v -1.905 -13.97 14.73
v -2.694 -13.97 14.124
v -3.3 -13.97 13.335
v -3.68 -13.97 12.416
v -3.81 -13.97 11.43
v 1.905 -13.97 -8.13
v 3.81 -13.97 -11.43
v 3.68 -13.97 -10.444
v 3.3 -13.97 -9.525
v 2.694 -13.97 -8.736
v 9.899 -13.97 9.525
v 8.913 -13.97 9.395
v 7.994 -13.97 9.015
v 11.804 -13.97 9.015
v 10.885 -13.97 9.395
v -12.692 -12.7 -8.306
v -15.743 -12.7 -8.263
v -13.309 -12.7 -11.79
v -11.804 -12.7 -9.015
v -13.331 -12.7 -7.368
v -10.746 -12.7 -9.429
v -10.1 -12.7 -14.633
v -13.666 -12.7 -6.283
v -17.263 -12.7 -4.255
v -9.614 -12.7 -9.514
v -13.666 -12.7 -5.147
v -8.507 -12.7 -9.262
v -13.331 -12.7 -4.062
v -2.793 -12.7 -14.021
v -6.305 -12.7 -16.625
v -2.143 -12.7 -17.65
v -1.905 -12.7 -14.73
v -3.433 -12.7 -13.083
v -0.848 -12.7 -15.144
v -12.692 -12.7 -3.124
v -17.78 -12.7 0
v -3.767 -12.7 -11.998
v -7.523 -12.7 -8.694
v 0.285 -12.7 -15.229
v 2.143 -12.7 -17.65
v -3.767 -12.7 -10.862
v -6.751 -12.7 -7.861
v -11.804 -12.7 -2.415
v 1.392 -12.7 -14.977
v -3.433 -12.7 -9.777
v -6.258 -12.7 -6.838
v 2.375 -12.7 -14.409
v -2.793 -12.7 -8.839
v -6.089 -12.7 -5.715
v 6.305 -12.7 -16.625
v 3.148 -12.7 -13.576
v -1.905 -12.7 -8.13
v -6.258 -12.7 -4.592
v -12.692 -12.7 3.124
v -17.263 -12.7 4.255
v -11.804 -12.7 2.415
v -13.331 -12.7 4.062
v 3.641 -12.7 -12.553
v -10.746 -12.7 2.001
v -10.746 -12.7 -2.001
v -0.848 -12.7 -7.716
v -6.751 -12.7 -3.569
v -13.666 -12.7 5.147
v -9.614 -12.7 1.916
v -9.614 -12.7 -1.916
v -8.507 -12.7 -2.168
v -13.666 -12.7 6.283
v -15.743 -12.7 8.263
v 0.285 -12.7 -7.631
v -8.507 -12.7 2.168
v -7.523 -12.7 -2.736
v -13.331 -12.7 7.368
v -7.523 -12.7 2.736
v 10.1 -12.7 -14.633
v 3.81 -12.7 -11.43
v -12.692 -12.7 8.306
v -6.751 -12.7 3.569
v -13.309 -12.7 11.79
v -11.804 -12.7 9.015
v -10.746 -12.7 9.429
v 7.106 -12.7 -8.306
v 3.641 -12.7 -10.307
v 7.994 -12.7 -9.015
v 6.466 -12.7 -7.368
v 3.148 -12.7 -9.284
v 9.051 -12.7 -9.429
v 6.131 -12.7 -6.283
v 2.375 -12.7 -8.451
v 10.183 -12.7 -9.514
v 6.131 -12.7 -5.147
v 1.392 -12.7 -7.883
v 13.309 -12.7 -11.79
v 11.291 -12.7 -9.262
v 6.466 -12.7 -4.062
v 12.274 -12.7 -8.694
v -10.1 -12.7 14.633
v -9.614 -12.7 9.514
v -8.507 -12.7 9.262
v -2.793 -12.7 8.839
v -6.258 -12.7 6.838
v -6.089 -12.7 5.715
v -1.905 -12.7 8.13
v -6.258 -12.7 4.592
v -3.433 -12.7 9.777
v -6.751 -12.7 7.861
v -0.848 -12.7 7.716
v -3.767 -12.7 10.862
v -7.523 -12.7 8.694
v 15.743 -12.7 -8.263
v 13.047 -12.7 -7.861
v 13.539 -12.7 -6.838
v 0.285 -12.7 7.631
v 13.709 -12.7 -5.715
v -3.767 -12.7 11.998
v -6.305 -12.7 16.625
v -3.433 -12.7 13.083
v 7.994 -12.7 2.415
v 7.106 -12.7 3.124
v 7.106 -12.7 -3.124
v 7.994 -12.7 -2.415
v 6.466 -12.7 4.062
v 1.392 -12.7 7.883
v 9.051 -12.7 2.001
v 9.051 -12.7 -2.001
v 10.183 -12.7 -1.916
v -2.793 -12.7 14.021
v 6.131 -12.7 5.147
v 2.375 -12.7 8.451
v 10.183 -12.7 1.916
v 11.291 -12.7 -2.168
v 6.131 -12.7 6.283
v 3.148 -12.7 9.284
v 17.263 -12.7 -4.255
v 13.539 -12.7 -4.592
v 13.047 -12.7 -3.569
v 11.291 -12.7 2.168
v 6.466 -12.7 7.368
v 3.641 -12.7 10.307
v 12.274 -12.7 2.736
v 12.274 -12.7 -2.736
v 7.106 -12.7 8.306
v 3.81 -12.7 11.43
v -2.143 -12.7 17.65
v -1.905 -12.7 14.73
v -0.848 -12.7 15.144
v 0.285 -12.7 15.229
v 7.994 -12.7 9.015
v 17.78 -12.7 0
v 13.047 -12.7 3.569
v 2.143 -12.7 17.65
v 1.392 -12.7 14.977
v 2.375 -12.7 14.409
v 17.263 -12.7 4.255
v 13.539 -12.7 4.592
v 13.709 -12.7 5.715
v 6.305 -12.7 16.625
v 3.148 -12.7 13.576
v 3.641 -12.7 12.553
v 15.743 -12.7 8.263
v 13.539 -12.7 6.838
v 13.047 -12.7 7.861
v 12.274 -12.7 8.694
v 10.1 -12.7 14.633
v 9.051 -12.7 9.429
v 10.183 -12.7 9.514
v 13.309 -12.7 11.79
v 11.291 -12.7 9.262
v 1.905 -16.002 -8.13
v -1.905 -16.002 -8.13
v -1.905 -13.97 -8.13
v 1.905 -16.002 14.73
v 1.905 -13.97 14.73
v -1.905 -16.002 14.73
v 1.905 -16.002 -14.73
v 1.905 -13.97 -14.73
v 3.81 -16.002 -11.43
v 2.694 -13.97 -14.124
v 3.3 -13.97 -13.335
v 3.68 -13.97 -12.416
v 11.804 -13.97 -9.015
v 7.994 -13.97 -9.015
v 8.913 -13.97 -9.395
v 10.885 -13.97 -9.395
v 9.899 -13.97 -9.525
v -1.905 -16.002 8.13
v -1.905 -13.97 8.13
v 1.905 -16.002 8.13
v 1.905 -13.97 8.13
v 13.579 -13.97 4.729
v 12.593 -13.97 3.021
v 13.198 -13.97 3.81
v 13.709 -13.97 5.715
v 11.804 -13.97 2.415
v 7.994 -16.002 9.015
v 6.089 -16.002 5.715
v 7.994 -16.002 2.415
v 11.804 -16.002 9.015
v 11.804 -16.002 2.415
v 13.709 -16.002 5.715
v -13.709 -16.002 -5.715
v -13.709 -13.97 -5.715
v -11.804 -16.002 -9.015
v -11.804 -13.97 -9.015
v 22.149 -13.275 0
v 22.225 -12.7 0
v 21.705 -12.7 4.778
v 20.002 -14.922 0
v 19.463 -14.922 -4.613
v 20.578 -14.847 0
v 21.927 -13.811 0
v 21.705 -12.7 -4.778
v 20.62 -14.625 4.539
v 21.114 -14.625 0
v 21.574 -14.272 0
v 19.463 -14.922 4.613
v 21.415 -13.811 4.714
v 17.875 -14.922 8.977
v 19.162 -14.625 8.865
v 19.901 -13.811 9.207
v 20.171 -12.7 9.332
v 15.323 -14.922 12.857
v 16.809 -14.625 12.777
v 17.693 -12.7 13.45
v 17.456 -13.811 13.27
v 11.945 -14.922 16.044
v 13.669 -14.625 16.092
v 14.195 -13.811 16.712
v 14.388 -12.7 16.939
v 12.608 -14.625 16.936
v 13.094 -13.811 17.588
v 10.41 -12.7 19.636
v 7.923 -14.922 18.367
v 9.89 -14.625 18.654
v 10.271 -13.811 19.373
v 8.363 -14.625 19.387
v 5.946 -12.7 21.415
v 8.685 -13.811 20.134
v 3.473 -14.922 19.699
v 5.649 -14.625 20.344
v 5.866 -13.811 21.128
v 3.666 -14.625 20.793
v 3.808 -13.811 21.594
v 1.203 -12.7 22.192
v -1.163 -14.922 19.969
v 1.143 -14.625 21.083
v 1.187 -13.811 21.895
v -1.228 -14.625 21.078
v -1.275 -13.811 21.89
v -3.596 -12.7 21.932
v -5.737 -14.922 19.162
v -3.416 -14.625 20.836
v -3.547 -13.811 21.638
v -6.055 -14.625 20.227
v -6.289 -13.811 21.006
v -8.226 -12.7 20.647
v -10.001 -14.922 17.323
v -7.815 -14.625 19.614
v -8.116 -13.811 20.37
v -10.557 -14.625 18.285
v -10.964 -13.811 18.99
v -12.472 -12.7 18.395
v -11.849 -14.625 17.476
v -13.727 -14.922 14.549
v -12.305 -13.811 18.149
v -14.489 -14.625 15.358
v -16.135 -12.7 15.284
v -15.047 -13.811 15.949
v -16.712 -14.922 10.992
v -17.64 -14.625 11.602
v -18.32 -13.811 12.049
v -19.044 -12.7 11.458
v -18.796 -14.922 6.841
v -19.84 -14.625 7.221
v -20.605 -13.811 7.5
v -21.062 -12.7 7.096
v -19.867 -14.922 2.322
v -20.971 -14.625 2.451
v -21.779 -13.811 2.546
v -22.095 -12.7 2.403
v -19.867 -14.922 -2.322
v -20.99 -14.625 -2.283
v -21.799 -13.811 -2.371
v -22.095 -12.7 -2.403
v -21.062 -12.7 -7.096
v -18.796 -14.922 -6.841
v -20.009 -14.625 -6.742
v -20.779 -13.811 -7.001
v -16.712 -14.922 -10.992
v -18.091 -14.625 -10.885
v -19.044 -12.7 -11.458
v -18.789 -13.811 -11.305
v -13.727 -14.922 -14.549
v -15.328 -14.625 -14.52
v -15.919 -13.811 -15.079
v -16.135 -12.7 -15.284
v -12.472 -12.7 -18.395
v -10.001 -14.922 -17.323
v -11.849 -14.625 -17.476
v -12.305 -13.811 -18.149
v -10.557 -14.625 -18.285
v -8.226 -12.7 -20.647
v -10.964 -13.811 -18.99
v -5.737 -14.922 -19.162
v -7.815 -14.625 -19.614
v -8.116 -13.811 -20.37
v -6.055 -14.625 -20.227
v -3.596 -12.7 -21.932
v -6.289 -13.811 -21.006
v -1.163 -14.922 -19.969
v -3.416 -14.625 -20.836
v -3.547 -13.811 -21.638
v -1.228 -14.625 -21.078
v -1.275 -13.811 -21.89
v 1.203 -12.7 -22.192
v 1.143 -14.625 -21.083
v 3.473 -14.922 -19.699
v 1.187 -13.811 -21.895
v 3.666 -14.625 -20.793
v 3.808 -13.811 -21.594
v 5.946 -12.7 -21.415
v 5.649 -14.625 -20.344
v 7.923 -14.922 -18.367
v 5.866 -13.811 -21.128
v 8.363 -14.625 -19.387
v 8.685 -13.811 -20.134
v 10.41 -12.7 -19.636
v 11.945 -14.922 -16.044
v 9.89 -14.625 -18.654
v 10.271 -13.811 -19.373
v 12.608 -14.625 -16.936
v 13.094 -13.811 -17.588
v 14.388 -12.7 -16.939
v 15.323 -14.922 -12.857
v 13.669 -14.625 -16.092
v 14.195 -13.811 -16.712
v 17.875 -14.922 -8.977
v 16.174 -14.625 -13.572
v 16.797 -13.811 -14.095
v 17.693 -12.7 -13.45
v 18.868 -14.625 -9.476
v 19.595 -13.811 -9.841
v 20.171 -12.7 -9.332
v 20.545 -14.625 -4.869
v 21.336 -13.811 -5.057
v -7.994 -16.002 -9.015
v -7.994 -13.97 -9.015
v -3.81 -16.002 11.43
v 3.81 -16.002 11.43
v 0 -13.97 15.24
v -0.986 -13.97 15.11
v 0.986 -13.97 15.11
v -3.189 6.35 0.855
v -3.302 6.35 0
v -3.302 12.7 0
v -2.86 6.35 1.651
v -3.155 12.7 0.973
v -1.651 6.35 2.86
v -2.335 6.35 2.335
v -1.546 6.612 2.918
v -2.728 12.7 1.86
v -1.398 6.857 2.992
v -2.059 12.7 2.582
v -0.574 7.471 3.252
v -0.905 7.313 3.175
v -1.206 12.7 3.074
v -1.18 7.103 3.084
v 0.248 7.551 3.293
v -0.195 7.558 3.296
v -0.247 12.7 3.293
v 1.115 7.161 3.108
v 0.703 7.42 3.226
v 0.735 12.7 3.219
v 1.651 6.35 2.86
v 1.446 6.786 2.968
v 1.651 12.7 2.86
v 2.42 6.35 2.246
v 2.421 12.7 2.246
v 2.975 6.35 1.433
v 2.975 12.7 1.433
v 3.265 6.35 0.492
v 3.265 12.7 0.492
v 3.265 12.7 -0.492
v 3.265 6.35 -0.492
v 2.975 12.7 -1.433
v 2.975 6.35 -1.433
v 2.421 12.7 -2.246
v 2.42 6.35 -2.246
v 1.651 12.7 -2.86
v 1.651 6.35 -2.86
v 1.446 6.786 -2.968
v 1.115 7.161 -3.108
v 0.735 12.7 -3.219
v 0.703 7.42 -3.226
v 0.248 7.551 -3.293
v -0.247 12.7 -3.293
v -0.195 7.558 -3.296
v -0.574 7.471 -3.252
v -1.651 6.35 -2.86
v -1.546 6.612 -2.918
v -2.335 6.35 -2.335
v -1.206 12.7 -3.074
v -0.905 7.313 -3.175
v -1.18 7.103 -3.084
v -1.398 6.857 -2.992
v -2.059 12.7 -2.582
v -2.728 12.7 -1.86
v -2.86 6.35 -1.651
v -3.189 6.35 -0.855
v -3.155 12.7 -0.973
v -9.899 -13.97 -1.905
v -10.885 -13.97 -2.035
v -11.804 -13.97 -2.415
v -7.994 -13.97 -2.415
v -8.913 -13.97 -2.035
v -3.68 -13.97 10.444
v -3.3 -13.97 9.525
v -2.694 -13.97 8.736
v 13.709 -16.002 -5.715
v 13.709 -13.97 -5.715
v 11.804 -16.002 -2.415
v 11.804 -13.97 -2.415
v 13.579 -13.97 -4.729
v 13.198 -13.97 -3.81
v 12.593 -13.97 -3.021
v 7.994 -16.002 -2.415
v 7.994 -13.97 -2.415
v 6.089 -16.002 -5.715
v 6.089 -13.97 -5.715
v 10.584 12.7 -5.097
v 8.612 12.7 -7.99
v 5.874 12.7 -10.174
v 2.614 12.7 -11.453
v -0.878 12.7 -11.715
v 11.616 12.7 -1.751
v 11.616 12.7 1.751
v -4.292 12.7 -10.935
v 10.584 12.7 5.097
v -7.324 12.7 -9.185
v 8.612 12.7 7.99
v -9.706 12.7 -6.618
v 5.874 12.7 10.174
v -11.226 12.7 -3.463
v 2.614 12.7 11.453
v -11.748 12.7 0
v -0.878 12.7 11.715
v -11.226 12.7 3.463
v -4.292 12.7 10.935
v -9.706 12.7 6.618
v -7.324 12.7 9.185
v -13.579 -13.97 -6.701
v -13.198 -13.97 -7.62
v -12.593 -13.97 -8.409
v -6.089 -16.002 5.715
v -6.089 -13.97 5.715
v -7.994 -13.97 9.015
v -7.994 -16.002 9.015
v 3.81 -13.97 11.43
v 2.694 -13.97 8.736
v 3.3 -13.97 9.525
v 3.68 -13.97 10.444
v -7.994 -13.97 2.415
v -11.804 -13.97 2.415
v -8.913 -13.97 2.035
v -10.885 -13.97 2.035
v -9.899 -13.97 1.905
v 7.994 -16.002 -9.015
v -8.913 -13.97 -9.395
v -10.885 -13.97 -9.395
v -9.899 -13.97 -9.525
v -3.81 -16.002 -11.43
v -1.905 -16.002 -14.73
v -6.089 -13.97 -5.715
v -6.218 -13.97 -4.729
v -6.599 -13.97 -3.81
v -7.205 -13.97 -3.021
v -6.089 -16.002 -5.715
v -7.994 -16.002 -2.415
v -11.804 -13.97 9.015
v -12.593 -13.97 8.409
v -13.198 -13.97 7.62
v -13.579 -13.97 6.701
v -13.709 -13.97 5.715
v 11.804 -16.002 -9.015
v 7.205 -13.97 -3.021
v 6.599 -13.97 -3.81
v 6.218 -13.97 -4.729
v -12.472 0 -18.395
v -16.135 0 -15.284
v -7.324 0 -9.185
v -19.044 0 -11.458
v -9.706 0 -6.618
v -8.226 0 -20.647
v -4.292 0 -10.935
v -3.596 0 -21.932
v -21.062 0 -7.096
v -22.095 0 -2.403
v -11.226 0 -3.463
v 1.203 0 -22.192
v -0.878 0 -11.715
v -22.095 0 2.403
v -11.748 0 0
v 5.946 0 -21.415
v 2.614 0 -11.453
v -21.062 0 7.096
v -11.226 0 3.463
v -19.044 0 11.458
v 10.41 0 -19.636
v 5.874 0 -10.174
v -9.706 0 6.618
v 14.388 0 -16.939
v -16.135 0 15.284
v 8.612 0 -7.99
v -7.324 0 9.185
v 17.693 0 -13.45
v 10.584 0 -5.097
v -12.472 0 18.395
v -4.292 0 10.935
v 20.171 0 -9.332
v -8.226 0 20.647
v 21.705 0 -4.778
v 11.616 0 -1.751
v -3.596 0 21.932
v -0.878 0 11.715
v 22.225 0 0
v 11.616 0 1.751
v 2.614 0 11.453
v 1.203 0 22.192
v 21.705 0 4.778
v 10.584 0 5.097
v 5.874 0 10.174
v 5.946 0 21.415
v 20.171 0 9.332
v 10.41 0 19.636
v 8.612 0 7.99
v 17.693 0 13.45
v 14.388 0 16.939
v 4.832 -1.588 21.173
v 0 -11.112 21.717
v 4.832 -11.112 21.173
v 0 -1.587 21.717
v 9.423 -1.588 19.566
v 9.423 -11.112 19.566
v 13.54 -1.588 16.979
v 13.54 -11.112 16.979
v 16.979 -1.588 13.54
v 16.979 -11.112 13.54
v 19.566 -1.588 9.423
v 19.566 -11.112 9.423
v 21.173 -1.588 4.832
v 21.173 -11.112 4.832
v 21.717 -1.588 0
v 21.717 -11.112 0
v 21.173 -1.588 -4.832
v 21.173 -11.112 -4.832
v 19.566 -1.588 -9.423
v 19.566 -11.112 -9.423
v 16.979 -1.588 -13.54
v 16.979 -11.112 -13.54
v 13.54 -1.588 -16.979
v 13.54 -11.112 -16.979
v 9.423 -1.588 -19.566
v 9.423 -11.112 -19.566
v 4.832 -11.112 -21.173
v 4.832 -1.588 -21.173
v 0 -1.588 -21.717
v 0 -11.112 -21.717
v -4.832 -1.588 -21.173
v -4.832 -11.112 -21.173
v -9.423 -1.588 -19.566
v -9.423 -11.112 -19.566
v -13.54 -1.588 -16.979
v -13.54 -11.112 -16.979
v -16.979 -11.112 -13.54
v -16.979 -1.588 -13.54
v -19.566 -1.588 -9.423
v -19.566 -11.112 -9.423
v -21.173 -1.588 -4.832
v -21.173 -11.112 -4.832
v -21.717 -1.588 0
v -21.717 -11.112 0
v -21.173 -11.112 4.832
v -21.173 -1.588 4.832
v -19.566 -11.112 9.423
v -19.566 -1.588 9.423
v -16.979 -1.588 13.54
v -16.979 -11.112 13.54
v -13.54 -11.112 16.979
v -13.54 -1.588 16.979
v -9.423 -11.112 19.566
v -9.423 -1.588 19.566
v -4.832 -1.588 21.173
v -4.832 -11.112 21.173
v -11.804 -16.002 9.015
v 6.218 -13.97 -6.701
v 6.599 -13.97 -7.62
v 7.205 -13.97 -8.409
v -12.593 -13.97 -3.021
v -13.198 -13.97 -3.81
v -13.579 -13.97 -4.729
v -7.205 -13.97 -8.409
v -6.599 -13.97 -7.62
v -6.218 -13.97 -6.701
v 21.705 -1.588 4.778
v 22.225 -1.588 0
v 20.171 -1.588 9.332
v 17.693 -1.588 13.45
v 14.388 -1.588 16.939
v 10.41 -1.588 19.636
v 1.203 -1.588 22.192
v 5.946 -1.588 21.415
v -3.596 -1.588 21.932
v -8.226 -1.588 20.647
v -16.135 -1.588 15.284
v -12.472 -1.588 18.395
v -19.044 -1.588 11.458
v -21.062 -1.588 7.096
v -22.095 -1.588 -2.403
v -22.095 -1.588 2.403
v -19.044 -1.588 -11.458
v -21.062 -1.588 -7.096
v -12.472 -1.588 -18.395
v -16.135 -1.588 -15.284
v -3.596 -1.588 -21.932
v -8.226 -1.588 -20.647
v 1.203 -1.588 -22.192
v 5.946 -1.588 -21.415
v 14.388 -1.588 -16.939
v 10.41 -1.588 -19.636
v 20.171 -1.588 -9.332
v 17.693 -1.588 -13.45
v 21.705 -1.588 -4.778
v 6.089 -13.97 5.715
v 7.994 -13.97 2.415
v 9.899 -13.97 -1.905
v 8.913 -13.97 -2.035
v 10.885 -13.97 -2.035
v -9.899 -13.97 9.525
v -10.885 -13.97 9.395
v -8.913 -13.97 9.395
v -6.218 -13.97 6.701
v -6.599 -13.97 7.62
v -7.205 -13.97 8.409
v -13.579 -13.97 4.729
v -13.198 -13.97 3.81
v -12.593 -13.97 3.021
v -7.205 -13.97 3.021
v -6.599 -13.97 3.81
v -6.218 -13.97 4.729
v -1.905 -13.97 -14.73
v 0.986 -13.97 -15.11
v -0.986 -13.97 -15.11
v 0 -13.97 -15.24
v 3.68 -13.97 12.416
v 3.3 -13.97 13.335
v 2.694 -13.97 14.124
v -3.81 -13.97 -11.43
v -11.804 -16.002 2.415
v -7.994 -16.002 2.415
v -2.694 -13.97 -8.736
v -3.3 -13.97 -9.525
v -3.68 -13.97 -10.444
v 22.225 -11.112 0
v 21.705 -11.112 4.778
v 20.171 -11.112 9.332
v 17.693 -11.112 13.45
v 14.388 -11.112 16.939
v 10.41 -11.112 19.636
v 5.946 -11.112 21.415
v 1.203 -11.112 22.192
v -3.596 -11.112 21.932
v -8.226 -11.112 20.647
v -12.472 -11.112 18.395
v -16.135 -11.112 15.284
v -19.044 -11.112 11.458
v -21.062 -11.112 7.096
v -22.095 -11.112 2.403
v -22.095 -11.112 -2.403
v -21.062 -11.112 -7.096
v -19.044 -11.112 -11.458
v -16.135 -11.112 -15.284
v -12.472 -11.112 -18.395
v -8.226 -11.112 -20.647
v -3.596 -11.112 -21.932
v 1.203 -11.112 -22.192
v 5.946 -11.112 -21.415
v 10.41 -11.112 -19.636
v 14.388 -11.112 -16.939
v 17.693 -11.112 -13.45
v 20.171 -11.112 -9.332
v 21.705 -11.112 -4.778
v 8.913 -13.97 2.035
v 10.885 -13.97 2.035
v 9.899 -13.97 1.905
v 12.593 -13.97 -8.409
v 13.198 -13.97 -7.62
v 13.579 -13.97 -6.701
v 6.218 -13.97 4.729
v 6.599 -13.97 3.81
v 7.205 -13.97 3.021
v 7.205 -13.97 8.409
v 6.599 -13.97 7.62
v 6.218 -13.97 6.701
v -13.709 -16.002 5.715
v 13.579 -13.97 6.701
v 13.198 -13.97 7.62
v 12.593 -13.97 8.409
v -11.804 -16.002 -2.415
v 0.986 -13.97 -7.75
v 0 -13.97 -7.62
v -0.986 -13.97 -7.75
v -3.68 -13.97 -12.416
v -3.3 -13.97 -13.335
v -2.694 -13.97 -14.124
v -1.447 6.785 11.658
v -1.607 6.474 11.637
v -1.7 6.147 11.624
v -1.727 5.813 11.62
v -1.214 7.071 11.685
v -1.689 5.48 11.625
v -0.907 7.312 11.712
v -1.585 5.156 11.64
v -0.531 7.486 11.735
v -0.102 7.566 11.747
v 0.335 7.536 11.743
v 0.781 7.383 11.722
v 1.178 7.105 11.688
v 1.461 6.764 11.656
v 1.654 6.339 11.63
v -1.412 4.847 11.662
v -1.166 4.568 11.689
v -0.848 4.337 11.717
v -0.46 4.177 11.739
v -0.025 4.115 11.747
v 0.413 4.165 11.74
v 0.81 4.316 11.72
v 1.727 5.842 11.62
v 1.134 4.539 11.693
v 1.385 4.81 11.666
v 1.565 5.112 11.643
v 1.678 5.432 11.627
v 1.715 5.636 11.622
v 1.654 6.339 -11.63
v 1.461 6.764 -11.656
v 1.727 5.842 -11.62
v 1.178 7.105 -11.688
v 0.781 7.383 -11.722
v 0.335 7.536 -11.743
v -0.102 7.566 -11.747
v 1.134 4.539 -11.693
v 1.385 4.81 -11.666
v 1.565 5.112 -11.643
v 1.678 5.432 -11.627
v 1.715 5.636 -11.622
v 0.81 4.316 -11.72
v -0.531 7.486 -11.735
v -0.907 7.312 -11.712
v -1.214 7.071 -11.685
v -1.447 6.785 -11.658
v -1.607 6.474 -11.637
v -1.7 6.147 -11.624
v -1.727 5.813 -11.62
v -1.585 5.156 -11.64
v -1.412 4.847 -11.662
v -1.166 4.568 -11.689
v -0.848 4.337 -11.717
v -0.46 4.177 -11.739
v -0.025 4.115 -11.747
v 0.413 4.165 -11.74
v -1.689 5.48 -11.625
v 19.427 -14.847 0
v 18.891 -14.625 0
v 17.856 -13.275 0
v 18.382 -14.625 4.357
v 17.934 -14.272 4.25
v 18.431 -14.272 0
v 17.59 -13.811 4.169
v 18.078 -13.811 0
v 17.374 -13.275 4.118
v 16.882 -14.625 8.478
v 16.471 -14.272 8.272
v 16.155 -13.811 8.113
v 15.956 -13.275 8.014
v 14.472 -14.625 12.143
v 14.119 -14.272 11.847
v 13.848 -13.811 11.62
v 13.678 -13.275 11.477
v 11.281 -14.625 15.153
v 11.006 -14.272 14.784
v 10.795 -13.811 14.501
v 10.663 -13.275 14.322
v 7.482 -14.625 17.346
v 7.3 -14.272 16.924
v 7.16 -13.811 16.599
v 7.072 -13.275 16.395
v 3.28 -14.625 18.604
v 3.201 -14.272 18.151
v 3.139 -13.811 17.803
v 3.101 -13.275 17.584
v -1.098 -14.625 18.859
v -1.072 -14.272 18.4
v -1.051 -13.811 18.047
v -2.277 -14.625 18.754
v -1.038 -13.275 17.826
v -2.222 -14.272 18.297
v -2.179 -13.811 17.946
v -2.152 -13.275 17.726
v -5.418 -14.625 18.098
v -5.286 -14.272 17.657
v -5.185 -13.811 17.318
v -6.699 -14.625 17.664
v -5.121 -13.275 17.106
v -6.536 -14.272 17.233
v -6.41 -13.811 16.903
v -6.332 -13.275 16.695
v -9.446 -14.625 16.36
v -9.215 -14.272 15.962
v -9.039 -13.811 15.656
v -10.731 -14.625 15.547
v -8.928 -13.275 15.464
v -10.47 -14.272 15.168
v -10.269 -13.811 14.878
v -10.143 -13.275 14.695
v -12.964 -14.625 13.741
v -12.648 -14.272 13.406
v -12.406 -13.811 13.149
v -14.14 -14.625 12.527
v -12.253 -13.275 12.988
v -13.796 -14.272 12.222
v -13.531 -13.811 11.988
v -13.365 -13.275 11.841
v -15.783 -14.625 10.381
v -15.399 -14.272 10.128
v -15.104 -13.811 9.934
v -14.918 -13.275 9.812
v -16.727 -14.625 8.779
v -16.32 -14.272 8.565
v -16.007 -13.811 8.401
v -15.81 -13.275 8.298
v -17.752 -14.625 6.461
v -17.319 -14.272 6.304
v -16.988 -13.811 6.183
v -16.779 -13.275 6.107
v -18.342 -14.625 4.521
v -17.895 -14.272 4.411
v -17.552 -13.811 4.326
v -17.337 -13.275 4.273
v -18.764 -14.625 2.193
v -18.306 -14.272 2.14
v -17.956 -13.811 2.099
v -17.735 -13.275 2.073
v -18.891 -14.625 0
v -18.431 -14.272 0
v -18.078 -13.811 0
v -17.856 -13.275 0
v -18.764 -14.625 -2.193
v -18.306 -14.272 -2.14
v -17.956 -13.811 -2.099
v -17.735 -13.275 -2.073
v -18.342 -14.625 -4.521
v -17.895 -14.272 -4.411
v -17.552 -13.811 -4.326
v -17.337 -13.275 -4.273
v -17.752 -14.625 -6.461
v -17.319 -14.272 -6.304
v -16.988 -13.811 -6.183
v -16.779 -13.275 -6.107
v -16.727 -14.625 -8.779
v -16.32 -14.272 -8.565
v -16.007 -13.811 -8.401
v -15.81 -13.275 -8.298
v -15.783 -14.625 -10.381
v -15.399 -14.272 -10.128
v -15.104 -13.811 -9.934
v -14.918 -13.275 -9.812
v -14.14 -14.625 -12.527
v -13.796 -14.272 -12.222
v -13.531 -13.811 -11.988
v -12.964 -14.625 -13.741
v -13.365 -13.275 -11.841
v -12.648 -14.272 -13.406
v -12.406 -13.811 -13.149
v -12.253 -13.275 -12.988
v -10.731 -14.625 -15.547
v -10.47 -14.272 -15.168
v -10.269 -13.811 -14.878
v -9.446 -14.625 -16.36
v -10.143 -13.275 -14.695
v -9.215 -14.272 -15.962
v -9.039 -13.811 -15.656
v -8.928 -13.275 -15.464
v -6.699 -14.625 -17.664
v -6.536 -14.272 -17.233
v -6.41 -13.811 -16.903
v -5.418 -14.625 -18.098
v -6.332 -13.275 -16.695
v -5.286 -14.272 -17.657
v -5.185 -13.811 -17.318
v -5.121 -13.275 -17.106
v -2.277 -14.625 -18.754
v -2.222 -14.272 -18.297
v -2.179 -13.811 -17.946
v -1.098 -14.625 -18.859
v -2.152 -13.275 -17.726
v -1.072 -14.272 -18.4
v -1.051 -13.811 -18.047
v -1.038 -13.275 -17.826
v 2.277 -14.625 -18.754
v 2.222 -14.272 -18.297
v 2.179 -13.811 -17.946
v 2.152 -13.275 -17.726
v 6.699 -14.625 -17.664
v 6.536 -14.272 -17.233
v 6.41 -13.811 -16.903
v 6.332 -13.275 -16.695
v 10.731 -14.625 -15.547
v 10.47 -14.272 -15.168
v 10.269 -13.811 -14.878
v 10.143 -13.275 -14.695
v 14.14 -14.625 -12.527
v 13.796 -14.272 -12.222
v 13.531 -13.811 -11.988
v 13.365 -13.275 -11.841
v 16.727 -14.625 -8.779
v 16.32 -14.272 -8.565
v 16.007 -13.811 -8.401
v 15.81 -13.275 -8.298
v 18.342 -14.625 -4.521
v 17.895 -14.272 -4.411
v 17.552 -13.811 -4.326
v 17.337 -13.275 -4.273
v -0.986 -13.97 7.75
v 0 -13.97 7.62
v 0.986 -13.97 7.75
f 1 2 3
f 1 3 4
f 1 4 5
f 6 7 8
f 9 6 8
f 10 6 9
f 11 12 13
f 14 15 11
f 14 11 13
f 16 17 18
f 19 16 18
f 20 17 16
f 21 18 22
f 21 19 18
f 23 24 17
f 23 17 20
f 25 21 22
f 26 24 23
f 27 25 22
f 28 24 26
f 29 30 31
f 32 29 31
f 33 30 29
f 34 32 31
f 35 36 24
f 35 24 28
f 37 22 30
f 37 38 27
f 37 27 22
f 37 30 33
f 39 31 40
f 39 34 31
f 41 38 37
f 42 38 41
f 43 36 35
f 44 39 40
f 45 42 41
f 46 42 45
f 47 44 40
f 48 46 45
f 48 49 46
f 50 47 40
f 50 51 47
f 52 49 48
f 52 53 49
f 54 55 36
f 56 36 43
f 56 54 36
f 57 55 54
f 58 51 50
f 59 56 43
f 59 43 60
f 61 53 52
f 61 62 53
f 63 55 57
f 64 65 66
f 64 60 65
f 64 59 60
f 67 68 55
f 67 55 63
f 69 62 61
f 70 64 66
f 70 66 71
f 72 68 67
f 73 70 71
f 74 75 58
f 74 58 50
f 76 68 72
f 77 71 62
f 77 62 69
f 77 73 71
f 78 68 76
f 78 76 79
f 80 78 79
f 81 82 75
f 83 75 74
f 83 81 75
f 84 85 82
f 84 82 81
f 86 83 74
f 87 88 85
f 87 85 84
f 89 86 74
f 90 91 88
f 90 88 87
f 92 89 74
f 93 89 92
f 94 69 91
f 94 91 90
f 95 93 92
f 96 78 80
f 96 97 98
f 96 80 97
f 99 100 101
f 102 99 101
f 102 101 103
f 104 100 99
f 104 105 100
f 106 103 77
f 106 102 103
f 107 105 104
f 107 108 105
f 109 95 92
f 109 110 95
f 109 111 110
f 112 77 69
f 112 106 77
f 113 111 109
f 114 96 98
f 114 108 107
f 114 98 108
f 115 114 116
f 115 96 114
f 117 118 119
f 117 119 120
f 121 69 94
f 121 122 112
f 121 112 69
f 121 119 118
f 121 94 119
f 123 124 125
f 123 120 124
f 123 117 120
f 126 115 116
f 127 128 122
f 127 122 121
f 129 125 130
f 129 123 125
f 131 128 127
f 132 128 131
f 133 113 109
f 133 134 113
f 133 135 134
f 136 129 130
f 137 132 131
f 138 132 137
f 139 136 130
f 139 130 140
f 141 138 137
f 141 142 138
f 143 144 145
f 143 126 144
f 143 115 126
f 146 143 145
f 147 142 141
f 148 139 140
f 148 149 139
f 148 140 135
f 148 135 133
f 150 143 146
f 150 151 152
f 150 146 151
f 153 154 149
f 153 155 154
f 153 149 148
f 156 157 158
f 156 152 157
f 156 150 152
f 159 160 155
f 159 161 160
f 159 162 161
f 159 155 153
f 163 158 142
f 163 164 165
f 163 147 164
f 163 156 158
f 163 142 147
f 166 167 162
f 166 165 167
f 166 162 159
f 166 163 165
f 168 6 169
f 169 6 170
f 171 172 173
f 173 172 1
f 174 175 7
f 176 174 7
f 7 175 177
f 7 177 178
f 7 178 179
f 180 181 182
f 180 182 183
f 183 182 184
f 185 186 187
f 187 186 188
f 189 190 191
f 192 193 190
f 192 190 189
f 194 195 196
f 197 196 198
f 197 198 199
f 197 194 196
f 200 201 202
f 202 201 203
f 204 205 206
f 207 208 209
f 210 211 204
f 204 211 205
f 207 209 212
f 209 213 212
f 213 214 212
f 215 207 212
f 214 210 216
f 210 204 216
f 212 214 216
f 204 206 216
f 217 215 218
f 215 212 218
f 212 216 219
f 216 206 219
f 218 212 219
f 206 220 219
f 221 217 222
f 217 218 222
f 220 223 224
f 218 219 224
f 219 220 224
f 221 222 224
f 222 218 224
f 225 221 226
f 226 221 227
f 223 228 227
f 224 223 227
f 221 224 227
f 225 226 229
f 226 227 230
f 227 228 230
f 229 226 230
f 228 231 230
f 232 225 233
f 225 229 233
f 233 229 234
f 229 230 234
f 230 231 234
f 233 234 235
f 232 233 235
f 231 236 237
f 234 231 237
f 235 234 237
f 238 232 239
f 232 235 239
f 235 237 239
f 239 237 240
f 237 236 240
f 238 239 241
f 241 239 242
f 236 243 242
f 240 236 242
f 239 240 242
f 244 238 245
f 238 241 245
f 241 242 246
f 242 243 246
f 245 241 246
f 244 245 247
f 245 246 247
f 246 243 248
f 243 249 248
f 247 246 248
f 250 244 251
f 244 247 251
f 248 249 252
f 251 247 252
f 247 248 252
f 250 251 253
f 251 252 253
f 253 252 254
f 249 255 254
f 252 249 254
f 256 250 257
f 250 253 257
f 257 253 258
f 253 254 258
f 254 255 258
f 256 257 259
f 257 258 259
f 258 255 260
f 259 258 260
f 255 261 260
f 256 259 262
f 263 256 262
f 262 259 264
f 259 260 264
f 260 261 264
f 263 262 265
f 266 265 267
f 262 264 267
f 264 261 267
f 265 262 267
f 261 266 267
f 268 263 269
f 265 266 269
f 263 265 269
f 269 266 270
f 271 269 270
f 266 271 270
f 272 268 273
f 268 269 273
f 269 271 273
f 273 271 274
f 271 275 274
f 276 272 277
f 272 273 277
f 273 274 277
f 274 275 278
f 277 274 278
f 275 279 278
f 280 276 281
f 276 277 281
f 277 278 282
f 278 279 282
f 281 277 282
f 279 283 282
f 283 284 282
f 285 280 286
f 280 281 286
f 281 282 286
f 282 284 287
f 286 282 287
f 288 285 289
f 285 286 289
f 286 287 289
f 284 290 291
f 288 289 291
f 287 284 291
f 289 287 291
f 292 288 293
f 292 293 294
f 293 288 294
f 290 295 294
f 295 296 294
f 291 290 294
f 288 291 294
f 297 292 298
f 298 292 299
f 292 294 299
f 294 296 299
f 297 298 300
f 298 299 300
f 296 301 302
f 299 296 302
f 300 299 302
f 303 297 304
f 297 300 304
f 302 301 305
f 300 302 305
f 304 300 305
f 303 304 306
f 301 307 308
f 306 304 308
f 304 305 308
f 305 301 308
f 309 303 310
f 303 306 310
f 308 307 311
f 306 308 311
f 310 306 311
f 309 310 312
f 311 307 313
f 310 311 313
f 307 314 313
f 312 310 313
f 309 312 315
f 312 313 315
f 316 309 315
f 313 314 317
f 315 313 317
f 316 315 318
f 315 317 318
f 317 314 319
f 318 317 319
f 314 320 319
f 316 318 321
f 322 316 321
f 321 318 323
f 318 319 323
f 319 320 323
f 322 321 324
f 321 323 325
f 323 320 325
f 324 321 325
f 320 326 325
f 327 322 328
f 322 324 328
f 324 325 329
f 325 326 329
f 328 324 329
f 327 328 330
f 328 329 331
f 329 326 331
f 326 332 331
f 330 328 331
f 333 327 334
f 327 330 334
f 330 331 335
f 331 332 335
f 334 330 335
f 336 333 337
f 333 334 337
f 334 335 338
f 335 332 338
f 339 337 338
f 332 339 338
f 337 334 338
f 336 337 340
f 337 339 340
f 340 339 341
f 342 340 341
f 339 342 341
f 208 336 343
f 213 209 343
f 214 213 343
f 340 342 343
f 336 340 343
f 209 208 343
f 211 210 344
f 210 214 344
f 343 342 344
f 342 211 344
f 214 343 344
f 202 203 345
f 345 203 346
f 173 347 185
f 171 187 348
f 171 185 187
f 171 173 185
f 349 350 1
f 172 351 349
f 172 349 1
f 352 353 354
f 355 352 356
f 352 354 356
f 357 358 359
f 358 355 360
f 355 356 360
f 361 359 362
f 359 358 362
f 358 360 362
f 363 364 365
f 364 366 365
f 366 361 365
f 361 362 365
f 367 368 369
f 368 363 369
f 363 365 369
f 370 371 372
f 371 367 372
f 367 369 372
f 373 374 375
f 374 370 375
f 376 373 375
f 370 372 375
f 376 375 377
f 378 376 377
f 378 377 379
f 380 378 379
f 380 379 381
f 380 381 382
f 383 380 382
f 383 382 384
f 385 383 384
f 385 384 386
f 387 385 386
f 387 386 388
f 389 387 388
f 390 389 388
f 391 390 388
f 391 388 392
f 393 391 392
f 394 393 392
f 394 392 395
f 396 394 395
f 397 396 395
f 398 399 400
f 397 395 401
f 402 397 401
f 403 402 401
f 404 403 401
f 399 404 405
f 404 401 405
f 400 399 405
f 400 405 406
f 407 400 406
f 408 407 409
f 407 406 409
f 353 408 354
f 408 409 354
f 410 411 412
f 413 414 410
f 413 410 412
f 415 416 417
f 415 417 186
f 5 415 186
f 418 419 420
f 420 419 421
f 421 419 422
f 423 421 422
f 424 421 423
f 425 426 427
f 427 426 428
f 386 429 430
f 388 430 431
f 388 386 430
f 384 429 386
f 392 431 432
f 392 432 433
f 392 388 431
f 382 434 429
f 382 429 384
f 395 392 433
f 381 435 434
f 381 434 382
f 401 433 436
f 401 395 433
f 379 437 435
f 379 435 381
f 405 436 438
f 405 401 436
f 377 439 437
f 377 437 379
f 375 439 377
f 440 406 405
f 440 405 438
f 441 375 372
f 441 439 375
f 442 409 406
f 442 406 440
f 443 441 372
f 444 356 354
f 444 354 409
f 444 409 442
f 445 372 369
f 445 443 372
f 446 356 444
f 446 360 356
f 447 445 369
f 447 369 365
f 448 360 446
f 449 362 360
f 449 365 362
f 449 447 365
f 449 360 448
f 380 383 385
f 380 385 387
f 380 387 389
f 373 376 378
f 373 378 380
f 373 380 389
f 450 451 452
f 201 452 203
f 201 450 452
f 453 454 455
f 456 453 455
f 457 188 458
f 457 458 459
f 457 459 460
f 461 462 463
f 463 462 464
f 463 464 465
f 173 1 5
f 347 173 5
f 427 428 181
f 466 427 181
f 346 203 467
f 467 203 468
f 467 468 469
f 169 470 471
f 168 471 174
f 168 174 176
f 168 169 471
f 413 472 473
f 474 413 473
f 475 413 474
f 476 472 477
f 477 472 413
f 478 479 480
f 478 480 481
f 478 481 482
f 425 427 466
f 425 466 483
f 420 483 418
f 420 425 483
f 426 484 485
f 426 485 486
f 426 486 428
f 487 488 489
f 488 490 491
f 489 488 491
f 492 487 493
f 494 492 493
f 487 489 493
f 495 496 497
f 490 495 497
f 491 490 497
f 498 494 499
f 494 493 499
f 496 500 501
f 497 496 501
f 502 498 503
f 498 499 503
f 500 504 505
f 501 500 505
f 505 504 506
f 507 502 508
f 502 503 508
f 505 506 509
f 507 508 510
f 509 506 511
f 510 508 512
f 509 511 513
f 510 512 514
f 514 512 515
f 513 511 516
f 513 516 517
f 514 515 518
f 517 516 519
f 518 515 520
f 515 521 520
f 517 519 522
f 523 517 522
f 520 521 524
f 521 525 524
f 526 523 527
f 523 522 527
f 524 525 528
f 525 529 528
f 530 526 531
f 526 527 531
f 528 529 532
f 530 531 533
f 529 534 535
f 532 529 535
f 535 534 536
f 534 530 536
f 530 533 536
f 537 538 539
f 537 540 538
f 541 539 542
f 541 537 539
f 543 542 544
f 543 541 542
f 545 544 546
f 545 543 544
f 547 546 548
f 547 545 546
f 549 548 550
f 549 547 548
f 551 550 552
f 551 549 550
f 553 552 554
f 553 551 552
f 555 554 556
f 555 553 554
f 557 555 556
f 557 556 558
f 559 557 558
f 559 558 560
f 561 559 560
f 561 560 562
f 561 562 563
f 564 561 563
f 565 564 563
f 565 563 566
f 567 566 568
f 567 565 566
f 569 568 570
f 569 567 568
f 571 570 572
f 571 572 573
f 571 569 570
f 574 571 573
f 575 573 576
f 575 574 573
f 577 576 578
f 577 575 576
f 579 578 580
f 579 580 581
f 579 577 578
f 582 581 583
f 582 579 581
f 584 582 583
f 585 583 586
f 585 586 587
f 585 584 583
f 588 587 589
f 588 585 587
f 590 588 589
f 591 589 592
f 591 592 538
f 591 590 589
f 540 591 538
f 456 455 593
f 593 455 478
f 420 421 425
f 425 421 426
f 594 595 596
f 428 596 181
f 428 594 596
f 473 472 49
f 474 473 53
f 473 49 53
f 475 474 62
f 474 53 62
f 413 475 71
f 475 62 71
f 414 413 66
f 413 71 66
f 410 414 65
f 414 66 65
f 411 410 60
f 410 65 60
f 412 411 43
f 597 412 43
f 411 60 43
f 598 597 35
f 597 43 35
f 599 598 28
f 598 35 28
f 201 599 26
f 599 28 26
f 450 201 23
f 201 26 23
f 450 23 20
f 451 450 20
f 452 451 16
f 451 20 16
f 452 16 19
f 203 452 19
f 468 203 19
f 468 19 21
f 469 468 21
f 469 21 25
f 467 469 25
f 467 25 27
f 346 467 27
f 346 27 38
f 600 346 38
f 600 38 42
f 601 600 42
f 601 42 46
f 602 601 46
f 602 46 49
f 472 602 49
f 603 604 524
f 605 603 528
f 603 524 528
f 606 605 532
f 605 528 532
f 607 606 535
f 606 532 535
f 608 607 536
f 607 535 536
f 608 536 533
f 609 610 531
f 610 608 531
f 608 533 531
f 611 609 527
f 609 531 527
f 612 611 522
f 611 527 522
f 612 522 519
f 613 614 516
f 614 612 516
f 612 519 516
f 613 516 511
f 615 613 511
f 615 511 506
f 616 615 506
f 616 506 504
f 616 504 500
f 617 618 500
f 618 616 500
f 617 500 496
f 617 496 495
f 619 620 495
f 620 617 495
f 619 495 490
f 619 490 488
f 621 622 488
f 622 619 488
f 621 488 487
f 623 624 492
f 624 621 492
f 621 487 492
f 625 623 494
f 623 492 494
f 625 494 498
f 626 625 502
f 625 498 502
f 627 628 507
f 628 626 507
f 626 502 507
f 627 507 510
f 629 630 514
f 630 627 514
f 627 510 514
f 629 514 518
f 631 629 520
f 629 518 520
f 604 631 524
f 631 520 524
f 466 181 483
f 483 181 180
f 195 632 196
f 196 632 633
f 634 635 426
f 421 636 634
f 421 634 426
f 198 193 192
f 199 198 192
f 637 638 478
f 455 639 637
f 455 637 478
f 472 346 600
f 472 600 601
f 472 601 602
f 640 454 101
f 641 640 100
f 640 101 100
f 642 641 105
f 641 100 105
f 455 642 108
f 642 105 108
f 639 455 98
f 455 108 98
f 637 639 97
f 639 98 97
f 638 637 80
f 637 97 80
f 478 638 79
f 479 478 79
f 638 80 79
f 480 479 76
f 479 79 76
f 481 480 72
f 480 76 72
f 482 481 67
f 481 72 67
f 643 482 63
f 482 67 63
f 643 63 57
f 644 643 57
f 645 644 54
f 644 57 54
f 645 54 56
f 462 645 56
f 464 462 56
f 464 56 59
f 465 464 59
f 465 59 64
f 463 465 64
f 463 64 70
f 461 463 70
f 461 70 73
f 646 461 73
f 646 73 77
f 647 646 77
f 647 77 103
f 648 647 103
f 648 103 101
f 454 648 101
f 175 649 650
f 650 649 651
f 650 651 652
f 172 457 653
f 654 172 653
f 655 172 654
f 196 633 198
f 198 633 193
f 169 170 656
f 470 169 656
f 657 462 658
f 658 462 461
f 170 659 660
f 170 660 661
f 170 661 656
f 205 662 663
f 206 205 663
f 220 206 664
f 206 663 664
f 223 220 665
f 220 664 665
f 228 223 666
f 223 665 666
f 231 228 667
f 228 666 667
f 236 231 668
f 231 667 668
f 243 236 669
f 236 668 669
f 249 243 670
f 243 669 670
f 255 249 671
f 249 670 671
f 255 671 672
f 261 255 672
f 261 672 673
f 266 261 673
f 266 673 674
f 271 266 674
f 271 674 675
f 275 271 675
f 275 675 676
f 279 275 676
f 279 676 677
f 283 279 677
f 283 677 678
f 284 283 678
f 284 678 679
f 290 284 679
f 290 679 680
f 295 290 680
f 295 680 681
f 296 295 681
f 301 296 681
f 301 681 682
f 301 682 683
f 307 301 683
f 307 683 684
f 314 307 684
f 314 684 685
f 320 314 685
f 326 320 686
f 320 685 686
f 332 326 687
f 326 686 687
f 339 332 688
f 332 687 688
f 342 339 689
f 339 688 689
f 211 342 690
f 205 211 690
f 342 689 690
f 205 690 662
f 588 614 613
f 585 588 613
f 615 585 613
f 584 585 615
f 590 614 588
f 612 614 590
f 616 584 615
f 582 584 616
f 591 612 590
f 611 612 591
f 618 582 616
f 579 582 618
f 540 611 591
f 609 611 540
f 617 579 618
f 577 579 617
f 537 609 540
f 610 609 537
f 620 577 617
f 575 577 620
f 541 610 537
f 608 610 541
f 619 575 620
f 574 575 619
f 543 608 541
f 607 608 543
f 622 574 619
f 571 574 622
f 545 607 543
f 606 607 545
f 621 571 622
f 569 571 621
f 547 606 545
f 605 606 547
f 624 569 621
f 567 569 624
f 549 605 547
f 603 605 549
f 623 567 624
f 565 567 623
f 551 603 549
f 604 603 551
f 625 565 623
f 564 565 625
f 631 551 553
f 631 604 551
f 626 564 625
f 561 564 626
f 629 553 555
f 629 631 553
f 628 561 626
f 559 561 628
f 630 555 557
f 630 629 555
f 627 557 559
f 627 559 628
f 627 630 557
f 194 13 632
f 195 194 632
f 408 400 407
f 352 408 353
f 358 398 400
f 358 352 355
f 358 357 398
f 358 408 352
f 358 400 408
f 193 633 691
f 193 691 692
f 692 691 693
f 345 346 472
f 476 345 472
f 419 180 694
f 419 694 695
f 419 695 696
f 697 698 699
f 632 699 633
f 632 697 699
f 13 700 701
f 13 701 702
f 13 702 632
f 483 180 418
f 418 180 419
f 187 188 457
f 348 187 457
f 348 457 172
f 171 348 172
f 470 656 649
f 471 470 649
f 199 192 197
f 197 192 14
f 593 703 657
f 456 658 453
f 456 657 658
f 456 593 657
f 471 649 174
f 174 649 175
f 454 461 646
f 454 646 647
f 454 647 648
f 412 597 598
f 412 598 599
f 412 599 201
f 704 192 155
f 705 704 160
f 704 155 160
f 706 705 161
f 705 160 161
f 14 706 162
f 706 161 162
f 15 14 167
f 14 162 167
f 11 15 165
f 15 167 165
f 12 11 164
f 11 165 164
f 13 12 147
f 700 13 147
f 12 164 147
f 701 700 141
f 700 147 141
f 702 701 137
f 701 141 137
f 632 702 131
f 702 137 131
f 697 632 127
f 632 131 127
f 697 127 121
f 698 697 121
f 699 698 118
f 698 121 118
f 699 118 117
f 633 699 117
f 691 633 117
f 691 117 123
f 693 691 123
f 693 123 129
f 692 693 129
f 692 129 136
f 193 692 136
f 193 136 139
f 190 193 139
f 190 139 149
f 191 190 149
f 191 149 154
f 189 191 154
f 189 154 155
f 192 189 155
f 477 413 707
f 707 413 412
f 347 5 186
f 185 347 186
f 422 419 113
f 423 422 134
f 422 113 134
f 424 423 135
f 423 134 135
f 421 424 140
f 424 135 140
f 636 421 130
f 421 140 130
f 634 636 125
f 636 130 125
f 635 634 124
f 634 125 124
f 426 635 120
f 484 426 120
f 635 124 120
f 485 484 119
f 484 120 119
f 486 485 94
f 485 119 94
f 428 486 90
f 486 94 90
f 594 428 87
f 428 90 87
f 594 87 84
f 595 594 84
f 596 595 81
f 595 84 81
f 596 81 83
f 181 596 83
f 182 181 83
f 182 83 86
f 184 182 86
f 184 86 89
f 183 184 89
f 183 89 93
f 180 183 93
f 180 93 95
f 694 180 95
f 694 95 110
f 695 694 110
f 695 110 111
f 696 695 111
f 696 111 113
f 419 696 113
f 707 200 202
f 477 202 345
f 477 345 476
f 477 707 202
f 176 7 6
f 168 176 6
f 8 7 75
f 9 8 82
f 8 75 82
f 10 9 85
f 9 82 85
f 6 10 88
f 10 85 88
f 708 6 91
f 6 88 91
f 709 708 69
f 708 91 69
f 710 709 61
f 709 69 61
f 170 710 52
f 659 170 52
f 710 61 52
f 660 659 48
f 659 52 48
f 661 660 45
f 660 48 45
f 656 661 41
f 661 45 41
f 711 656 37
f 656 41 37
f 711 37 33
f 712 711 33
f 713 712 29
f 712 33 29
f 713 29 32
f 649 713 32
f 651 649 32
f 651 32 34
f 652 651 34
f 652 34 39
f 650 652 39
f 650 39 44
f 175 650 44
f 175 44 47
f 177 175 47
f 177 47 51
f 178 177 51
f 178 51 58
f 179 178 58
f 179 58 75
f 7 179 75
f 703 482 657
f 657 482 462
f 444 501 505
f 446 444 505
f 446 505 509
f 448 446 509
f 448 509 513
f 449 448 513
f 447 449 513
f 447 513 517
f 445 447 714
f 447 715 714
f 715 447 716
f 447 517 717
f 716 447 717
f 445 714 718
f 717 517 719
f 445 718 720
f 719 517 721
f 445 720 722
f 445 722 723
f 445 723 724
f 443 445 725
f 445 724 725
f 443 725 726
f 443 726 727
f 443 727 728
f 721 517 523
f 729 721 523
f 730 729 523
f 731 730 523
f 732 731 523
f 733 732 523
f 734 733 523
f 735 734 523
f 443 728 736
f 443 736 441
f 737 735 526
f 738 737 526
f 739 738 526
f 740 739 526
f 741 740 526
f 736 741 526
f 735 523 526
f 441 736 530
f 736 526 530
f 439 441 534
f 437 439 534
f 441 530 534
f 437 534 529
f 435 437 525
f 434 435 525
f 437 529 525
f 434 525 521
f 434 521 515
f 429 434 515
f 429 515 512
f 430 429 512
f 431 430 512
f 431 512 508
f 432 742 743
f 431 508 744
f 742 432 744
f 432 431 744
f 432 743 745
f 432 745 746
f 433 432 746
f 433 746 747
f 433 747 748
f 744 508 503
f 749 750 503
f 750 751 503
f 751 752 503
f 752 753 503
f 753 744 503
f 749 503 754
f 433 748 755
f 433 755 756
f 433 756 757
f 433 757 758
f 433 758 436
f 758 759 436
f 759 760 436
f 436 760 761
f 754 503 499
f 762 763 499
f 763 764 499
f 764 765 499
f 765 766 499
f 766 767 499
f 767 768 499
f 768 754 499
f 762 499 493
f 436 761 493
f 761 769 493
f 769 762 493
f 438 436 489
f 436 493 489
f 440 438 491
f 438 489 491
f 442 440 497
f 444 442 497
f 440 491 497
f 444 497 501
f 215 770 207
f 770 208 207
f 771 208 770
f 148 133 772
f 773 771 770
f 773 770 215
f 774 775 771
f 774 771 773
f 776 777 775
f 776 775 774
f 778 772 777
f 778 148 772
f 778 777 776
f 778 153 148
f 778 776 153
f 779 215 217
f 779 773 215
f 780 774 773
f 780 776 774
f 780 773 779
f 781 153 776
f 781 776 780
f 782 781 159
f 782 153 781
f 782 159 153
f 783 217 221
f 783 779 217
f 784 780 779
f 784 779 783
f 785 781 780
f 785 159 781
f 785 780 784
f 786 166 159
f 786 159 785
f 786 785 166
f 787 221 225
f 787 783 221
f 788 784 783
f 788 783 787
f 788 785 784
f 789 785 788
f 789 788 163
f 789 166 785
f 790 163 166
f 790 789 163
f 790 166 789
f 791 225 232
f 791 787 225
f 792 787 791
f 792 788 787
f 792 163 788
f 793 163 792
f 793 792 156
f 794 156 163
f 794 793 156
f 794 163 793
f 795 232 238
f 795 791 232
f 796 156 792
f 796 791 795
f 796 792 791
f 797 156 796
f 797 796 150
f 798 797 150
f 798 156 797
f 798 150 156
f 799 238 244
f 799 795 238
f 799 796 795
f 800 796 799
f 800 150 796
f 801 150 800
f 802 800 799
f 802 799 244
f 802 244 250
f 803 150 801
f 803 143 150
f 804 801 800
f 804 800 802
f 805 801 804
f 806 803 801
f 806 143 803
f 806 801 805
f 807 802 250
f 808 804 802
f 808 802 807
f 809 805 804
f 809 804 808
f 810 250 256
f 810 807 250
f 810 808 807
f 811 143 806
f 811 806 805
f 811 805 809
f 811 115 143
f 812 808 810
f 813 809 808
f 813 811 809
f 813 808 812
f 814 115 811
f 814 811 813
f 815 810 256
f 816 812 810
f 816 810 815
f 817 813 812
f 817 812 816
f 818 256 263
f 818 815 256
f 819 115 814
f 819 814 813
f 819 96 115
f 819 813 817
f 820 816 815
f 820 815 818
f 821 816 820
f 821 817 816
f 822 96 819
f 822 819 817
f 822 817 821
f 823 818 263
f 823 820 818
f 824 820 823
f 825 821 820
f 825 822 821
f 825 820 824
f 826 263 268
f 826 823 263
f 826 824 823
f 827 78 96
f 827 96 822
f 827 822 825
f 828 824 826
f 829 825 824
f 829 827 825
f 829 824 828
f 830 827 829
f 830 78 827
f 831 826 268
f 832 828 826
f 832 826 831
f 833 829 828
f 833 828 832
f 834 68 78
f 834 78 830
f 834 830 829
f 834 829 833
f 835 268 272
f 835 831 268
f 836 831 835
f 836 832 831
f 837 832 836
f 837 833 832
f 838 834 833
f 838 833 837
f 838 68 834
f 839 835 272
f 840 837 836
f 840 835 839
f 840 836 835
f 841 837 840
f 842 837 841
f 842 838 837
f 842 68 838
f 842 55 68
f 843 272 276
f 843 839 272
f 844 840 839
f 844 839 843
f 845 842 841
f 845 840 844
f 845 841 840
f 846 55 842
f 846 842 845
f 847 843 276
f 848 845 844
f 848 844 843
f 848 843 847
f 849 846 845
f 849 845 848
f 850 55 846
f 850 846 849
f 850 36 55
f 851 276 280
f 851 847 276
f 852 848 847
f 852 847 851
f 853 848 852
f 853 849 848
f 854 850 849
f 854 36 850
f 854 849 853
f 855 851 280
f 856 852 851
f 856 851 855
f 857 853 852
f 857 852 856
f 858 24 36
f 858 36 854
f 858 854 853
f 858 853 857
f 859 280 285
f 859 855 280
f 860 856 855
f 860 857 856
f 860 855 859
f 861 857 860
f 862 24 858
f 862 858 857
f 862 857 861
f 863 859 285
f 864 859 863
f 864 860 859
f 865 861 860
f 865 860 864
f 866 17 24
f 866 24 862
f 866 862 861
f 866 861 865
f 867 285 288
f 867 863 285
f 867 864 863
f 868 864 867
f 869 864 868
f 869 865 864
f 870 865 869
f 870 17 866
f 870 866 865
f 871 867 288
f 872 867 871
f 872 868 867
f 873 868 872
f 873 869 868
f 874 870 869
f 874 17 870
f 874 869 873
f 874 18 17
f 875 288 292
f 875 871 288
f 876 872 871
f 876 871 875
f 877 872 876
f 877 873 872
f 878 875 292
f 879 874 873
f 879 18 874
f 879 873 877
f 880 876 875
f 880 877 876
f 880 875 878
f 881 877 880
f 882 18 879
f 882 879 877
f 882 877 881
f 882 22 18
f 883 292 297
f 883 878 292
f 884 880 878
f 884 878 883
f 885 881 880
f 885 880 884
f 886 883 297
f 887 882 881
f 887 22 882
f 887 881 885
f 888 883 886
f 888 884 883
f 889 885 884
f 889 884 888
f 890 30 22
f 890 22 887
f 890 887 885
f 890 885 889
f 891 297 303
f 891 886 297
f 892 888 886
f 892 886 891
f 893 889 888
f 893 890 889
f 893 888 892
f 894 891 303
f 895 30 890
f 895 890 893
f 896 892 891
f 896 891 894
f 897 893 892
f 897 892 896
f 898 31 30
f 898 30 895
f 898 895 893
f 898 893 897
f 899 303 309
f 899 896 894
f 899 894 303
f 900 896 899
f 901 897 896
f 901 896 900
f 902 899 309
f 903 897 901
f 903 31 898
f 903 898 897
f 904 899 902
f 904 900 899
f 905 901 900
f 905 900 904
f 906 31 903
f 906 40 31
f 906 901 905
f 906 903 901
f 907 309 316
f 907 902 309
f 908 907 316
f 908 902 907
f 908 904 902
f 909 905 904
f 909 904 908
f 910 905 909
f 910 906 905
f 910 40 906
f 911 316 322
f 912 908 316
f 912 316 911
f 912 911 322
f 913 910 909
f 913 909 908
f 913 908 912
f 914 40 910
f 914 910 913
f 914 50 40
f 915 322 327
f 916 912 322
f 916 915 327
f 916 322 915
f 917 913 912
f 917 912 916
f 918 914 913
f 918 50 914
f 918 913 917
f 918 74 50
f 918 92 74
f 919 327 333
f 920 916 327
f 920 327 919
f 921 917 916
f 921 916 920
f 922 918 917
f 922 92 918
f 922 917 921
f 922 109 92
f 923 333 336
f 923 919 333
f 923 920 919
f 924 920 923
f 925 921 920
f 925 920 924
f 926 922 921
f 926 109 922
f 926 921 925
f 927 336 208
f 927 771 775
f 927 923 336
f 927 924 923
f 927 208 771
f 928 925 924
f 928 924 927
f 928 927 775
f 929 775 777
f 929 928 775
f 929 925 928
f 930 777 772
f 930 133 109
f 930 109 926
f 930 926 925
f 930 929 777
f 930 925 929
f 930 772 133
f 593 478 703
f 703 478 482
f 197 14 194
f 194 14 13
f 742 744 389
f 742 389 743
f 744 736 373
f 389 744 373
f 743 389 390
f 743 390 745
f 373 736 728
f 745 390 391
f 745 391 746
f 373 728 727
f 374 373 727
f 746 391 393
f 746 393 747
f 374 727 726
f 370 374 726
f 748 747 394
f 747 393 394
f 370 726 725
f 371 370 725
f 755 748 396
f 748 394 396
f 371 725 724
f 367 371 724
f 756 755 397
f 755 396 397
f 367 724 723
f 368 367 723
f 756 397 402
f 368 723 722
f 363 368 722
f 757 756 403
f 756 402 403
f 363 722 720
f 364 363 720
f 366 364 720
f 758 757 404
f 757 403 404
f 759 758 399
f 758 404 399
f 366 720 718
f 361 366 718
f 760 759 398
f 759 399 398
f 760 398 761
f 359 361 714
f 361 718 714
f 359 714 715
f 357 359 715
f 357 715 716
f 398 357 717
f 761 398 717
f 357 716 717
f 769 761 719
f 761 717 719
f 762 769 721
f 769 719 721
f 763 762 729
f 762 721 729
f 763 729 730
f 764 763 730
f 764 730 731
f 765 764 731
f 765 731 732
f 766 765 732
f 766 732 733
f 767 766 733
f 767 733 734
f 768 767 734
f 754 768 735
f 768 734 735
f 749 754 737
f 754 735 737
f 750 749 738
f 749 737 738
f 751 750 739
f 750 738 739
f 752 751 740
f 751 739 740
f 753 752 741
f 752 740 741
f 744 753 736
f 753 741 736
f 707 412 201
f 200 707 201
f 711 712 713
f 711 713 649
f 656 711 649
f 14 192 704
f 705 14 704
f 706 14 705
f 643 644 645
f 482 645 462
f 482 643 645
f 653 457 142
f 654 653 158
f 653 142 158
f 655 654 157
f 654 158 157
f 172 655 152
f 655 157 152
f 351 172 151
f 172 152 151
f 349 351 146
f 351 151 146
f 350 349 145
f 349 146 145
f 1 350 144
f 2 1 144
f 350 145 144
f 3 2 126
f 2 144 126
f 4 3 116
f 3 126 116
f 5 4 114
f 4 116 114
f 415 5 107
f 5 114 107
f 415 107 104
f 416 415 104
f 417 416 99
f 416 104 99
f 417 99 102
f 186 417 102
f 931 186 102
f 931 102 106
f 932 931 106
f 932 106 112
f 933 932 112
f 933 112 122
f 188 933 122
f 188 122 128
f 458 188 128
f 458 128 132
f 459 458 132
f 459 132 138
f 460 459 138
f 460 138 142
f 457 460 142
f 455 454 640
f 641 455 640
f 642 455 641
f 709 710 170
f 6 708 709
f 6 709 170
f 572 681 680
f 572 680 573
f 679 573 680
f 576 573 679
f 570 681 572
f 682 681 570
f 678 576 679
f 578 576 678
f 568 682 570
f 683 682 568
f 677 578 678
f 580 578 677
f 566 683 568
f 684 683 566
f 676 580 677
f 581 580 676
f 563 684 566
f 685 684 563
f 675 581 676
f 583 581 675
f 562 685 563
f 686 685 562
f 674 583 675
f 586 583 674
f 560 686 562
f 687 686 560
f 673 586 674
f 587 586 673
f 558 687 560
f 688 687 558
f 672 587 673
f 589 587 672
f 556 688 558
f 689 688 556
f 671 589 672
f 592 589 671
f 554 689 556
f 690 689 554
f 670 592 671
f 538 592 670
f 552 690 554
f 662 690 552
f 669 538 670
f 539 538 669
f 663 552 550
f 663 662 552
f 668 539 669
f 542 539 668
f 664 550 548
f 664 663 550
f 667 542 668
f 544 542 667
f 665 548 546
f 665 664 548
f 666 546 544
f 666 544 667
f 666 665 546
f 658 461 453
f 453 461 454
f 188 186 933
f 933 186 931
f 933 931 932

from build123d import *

# Parameters (mm, degrees)
F0_R      = 22.225
F1_DEPTH  = 12.7
F2_R      = 3.81
F3_DEPTH  = 1.27
F5_DEPTH  = 2.032
F6_R      = 22.225
F6_R_2    = 17.78
F7_DEPTH  = 2.2225
F8_R      = 2.22249
F9_R      = 2.2225
F10_R     = 11.7475
F11_DEPTH = 12.7
F12_R     = 3.302
F13_DEPTH = 6.35
F14_R     = 1.7272
F15_DEPTH = 63.5
F16_W     = 9.525
F16_H     = 0.508


# Not quite as in the source:
# - a fillet or chamfer is up to 0.001 mm smaller than in the source, because OpenCascade refuses the exact size


with BuildPart() as f1:
    # F0 (on Front) → F1 (new body)
    with BuildSketch(Plane.XZ):
        Circle(F0_R)
    extrude(amount=F1_DEPTH)

    # F2 (on face) → F3 (join)
    with BuildSketch(Plane.XZ.offset(12.7)):
        with Locations((0, 11.43)):
            Circle(F2_R)
        with Locations((-9.8986703653, 5.715)):
            Circle(F2_R)
        with Locations((-9.8986703653, -5.715)):
            Circle(F2_R)
        with Locations((0, -11.43)):
            Circle(F2_R)
        with Locations((9.8986703653, -5.715)):
            Circle(F2_R)
        with Locations((9.8986703653, 5.715)):
            Circle(F2_R)
    extrude(amount=F3_DEPTH)

    # F4 (on face) → F5 (join)
    with BuildSketch(Plane.XZ.offset(13.97)):
        Polygon((1.905, 8.1304432116), (3.81, 11.43), (1.905, 14.7295567884), (-1.905, 14.7295567884), (-3.81, 11.43), (-1.905, 8.1304432116), align=None)
        Polygon((-7.9936703653, 2.4154432116), (-6.0886703653, 5.715), (-7.9936703653, 9.0145567884), (-11.8036703653, 9.0145567884), (-13.7086703653, 5.715), (-11.8036703653, 2.4154432116), align=None)
        Polygon((7.9936703653, 9.0145567884), (6.0886703653, 5.715), (7.9936703653, 2.4154432116), (11.8036703653, 2.4154432116), (13.7086703653, 5.715), (11.8036703653, 9.0145567884), align=None)
        Polygon((-7.9936703653, -2.4154432116), (-11.8036703653, -2.4154432116), (-13.7086703653, -5.715), (-11.8036703653, -9.0145567884), (-7.9936703653, -9.0145567884), (-6.0886703653, -5.715), align=None)
        Polygon((3.81, -11.43), (1.905, -8.1304432116), (-1.905, -8.1304432116), (-3.81, -11.43), (-1.905, -14.7295567884), (1.905, -14.7295567884), align=None)
        Polygon((7.9936703653, -2.4154432116), (6.0886703653, -5.715), (7.9936703653, -9.0145567884), (11.8036703653, -9.0145567884), (13.7086703653, -5.715), (11.8036703653, -2.4154432116), align=None)
    extrude(amount=F5_DEPTH)

    # F6 (on face) → F7 (join)
    with BuildSketch(Plane.XZ.offset(12.7)):
        Circle(F6_R)
        Circle(F6_R_2, mode=Mode.SUBTRACT)
    extrude(amount=F7_DEPTH)

    # F8 (radius 2.2225 in the source; OpenCascade refuses exactly that, so slightly less here)
    f8_edges = [f1.edges().sort_by_distance(p)[0] for p in [
        (-17.78, -14.9225, 0),
    ]]
    fillet(f8_edges, radius=F8_R)

    # F9
    f9_edges = [f1.edges().sort_by_distance(p)[0] for p in [
        (-22.225, -14.9225, 0),
    ]]
    fillet(f9_edges, radius=F9_R)

    # F10 (on face) → F11 (join)
    with BuildSketch(Plane(origin=(0, 0, 0), x_dir=(-1, 0, 0), z_dir=(0, 1, 0))):
        Circle(F10_R)
    extrude(amount=F11_DEPTH)

    # F12 (on face) → F13 (cut)
    with BuildSketch(Plane(origin=(0, 12.7, 0), x_dir=(-1, 0, 0), z_dir=(0, 1, 0))):
        Circle(F12_R)
    extrude(amount=-F13_DEPTH, mode=Mode.SUBTRACT)

    # F14 (on Top) → F15 (cut, symmetric)
    with BuildSketch(Plane.XY):
        with Locations((0, 5.842)):
            Circle(F14_R)
    extrude(amount=F15_DEPTH, both=True, mode=Mode.SUBTRACT)

    # F16 (on Right) → F18 (revolve, cut)
    with BuildSketch(Plane.YZ):
        with Locations((-6.35, 22.479)):
            Rectangle(F16_W, F16_H)
        with Locations((-6.35, 21.971)):
            Rectangle(F16_W, F16_H)
    revolve(axis=Axis((0, 11.6996625438, 0), (0, 1, 0)), mode=Mode.SUBTRACT)


solid = f1.part
